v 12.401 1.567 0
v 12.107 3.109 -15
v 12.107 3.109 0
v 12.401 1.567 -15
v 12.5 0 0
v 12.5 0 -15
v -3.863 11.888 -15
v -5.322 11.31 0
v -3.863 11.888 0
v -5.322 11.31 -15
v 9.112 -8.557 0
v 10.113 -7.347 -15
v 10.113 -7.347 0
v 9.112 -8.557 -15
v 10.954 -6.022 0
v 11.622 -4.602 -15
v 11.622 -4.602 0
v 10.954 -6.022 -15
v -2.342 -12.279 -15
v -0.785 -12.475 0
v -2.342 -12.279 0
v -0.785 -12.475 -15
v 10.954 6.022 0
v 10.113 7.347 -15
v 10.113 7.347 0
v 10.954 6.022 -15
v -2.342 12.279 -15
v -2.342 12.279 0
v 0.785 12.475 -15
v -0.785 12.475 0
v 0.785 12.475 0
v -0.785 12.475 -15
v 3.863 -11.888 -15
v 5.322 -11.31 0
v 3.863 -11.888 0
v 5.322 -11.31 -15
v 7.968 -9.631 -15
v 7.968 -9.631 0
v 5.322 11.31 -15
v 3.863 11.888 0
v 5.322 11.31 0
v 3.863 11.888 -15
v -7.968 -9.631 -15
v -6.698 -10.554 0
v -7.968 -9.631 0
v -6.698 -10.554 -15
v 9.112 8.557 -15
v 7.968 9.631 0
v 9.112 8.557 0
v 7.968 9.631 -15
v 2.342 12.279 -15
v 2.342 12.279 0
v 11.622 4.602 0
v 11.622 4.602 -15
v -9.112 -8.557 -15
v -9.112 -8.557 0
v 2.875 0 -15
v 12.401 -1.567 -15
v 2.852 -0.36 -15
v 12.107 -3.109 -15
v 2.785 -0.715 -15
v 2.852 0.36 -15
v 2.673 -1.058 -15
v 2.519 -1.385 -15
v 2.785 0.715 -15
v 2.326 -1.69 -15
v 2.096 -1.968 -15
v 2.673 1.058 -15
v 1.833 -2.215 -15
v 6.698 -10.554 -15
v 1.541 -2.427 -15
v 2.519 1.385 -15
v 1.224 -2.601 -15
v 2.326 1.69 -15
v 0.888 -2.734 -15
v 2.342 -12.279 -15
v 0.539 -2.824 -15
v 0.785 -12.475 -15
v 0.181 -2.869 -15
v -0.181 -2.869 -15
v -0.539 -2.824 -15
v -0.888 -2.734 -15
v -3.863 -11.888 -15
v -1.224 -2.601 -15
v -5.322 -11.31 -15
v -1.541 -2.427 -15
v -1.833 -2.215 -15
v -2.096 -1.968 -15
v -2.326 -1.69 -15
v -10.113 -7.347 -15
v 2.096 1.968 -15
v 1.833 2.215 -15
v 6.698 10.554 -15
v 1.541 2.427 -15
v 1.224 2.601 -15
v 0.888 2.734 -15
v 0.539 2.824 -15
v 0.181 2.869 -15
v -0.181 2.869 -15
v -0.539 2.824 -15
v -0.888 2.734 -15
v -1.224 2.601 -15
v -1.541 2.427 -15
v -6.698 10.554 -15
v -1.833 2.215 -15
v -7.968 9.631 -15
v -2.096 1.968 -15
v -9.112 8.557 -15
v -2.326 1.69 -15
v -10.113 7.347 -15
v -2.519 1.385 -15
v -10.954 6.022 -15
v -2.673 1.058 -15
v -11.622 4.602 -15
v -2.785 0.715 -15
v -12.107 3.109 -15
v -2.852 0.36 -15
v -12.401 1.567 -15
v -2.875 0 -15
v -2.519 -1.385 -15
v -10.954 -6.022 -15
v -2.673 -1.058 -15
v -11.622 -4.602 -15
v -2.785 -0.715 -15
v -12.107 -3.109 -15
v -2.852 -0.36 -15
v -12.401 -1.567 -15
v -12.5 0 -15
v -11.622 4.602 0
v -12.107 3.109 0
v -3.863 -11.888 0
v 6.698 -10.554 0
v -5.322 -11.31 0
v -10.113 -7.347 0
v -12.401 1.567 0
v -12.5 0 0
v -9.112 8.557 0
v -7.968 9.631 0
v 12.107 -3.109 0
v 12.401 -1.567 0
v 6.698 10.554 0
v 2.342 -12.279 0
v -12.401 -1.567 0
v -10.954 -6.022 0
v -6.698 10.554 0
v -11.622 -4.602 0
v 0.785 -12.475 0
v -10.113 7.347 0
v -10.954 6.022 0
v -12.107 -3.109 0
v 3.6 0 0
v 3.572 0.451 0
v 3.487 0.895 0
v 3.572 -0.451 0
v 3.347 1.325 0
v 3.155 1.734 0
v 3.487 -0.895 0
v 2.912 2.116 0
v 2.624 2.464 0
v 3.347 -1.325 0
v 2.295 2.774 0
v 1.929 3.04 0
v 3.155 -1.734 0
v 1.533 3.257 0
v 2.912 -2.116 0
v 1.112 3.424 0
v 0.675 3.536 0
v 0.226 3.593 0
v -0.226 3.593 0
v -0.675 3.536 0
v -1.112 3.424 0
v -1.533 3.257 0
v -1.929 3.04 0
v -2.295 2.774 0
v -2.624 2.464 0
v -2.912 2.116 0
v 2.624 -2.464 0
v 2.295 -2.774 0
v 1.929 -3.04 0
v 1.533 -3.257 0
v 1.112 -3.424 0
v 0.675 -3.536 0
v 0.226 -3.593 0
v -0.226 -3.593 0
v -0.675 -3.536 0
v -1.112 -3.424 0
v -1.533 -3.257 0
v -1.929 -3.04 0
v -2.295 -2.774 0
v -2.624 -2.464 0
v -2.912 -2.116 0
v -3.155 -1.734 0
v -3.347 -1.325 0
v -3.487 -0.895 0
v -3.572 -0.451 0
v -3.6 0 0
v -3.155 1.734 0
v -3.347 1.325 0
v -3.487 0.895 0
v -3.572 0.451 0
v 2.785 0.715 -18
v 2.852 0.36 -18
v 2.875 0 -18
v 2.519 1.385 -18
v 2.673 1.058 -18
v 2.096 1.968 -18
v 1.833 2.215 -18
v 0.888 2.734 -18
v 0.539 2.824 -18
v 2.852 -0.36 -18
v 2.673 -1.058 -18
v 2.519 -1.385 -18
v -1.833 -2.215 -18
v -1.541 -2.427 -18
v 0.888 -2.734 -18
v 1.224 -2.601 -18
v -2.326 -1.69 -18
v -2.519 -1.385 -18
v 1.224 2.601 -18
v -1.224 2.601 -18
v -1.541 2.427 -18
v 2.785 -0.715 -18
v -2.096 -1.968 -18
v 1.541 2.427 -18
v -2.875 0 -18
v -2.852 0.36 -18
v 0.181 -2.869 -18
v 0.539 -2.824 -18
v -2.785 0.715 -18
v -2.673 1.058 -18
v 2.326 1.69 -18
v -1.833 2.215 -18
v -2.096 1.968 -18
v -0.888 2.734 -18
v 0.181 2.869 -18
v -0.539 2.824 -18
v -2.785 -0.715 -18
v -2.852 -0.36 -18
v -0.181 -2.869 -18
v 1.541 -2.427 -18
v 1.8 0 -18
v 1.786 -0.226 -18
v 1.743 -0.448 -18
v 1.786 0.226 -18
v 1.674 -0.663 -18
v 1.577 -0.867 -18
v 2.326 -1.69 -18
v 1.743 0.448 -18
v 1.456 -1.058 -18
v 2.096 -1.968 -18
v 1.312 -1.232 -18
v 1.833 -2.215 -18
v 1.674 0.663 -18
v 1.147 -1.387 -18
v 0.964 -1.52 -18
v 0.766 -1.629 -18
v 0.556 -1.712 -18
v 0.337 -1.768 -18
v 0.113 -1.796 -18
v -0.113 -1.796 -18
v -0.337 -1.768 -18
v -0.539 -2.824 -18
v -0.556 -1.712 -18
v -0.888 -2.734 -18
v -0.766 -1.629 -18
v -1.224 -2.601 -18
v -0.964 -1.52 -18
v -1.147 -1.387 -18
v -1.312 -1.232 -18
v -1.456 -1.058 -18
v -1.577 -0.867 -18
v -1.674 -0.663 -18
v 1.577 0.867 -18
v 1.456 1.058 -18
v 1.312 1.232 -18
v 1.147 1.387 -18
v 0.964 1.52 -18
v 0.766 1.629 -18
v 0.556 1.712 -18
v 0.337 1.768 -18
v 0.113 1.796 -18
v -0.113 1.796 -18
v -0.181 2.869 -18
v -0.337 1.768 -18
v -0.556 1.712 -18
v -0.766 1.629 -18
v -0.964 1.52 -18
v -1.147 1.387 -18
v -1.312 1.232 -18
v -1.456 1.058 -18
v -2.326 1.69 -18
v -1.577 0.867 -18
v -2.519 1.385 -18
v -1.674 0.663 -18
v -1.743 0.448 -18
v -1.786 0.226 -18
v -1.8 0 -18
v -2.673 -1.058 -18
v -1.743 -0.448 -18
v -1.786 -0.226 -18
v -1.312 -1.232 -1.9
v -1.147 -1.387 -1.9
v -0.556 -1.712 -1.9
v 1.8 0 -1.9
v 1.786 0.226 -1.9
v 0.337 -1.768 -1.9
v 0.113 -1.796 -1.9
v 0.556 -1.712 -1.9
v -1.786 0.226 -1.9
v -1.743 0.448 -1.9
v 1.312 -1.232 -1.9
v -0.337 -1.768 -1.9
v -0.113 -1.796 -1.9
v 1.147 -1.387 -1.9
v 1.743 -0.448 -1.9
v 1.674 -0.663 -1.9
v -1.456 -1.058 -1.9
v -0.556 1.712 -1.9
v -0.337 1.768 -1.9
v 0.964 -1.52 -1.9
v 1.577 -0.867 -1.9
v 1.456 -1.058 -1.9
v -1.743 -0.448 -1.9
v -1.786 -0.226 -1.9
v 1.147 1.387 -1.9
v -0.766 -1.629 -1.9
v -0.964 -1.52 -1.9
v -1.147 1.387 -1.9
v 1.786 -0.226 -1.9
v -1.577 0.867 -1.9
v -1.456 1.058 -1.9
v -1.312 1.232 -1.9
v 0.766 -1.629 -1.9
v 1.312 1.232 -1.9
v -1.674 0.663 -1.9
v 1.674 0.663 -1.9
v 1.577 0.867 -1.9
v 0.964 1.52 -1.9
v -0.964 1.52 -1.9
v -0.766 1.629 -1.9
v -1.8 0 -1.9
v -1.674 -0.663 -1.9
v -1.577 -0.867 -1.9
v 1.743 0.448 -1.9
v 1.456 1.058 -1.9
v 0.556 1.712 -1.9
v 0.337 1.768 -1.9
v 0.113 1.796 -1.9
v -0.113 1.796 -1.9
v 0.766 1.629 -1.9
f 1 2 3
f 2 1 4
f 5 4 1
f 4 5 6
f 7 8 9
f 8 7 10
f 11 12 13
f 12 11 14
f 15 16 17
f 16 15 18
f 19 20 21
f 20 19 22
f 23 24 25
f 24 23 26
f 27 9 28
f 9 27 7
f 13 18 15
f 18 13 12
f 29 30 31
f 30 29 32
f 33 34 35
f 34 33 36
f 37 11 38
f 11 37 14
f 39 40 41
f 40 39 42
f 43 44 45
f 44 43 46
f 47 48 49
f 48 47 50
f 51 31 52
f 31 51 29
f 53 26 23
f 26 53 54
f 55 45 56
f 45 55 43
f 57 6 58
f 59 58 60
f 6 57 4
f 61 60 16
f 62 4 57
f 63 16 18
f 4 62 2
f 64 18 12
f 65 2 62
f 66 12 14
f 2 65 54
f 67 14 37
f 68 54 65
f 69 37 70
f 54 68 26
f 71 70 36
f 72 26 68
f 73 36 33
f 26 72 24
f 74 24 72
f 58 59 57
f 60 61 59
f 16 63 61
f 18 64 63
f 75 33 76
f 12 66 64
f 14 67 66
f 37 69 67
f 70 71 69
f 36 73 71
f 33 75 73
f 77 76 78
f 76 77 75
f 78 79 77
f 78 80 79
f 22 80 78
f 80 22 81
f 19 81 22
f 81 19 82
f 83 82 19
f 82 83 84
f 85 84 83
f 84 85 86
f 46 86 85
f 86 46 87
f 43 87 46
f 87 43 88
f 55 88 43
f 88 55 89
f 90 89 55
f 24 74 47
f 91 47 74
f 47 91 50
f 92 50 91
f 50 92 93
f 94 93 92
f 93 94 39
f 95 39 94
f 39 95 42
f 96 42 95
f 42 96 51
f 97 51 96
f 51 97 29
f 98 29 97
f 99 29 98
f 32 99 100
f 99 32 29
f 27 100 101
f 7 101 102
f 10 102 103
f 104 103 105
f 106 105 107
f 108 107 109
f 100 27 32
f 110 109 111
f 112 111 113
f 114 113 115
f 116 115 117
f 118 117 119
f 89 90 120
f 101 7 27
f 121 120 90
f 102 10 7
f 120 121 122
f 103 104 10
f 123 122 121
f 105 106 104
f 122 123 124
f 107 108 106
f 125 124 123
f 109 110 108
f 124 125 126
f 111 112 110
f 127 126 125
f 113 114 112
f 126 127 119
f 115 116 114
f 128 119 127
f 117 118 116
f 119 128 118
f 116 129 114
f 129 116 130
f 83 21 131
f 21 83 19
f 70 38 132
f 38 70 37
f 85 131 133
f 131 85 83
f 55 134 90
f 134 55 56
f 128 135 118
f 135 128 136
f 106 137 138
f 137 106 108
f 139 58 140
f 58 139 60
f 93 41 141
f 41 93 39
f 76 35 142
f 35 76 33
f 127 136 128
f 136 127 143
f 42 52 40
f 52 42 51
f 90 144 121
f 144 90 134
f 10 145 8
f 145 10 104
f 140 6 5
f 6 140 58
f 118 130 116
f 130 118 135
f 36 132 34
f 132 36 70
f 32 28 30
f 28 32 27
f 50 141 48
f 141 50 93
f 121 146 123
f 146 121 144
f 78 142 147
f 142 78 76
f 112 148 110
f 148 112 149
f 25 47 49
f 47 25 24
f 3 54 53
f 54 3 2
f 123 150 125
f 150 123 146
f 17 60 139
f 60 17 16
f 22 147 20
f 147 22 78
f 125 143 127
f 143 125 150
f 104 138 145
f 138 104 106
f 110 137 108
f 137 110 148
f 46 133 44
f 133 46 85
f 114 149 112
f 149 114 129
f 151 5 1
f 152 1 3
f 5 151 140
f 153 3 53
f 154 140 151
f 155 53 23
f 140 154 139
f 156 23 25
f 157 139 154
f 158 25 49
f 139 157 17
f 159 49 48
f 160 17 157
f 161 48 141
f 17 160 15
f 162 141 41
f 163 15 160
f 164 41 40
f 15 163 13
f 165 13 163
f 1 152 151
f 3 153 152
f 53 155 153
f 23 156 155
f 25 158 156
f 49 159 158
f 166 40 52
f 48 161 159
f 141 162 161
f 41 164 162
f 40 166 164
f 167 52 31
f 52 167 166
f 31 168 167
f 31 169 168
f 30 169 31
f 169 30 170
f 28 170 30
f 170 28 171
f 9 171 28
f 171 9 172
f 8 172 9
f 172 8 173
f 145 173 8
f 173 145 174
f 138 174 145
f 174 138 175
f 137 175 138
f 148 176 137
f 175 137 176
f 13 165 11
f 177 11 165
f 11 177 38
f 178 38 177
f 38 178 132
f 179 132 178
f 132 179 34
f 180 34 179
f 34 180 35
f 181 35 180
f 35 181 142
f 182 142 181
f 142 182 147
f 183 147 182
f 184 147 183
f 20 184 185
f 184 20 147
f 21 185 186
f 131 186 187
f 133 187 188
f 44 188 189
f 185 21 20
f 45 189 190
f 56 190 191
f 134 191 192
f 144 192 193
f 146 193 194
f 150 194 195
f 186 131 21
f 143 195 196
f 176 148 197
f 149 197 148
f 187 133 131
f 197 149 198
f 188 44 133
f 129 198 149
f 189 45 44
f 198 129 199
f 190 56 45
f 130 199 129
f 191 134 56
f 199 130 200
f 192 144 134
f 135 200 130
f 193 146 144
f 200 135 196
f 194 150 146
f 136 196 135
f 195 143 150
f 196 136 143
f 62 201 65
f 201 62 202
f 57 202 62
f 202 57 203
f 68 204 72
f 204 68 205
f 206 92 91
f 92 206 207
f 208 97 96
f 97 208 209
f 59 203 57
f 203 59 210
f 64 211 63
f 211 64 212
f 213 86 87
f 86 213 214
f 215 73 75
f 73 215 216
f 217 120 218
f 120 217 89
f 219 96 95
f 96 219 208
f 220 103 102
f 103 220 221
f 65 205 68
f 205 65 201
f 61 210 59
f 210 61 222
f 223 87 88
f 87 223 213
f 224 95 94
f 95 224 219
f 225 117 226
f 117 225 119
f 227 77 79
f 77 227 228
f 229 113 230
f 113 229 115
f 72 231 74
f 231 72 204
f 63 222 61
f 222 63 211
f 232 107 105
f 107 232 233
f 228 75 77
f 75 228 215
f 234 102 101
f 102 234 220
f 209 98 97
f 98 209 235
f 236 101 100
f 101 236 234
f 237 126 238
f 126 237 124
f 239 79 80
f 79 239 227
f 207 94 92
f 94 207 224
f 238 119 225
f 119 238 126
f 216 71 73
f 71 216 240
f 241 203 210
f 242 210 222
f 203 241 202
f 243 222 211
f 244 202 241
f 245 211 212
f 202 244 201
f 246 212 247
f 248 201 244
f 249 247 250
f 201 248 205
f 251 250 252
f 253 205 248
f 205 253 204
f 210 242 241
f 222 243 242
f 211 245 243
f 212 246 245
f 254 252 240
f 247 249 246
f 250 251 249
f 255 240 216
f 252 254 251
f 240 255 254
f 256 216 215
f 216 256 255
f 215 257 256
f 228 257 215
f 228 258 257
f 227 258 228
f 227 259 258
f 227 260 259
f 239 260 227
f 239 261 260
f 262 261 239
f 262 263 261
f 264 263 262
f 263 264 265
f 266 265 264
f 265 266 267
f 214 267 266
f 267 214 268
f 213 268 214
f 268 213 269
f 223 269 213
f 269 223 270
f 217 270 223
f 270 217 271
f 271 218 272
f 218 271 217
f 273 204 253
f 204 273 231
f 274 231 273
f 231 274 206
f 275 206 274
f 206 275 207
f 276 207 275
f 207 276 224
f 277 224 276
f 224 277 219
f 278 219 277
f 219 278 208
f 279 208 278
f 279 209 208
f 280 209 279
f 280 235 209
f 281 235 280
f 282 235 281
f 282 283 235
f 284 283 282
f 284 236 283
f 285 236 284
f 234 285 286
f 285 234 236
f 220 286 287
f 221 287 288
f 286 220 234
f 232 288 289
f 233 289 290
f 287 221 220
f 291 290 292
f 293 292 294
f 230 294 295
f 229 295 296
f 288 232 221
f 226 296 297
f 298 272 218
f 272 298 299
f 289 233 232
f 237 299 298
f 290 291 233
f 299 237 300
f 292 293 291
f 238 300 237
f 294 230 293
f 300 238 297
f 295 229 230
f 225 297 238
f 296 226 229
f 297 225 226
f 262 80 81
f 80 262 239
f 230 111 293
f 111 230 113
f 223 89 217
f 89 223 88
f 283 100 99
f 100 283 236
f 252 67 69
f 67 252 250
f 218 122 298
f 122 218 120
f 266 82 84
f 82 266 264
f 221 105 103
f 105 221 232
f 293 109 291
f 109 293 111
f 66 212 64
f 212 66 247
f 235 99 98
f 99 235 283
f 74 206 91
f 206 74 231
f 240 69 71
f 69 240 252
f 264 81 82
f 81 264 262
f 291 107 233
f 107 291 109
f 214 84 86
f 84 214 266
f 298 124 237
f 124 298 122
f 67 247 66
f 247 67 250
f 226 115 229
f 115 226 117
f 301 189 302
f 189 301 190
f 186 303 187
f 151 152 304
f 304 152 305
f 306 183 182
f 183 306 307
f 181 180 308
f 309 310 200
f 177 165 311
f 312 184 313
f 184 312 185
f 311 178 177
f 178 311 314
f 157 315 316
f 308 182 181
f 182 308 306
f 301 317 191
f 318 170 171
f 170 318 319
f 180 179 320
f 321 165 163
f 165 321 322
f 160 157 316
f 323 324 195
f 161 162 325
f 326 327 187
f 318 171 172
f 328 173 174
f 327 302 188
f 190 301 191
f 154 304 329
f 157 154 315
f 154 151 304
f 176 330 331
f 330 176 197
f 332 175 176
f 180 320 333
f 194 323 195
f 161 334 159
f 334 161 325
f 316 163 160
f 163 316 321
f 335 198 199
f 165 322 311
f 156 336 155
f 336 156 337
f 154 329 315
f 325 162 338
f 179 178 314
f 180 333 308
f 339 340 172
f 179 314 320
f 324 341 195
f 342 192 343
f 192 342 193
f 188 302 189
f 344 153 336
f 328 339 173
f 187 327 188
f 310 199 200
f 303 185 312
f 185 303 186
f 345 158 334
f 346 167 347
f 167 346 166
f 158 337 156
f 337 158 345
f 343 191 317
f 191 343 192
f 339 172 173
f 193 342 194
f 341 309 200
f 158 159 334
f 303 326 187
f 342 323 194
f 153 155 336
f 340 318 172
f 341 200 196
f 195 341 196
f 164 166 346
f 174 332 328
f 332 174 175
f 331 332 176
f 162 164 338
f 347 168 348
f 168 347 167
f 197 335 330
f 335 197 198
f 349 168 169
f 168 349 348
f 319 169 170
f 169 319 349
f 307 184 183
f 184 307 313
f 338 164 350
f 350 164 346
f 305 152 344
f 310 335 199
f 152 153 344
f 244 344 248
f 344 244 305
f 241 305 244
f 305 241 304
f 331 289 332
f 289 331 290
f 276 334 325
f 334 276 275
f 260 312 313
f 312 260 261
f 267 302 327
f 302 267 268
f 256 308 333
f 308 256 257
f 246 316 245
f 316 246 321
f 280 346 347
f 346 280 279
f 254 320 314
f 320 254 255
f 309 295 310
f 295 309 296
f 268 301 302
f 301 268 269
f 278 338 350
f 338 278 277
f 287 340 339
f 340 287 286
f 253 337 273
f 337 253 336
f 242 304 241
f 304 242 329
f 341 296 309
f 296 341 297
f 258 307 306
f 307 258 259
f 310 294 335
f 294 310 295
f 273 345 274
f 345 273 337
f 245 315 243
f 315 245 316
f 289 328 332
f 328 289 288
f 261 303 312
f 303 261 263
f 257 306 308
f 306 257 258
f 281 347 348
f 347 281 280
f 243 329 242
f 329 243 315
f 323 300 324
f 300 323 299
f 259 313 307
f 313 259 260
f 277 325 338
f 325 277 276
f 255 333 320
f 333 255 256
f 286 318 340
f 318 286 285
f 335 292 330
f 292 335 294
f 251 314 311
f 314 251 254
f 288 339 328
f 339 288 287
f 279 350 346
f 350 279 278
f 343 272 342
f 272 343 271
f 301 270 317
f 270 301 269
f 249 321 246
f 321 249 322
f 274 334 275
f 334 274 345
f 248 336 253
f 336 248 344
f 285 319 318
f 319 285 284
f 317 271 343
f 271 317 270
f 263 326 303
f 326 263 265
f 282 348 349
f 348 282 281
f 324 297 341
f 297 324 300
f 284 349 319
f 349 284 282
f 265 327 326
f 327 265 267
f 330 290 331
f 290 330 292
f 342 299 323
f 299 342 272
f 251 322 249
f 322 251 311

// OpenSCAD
$fn = 50;

difference() {
	union() {
		translate(v = [0, 0, -15.0]) {
			cylinder(h = 15, r = 12.5);
		}
		#translate(v = [0, 0, -18.0]) {
			cylinder(h = 18, r = 2.875);
		}
	}
	union() {
		translate(v = [0, 0, 0]) {
			rotate(a = [0, 0, 0]) {
				difference() {
					union() {
						translate(v = [0, 0, -18.0]) {
							cylinder(h = 18, r = 1.5);
						}
						translate(v = [0, 0, -1.9]) {
							cylinder(h = 1.9, r1 = 1.8, r2 = 3.6);
						}
						translate(v = [0, 0, -18.0]) {
							cylinder(h = 18, r = 1.8);
						}
						translate(v = [0, 0, -18.0]) {
							cylinder(h = 18, r = 1.5);
						}
					}
					union();
				}
			}
		}
	}
}
